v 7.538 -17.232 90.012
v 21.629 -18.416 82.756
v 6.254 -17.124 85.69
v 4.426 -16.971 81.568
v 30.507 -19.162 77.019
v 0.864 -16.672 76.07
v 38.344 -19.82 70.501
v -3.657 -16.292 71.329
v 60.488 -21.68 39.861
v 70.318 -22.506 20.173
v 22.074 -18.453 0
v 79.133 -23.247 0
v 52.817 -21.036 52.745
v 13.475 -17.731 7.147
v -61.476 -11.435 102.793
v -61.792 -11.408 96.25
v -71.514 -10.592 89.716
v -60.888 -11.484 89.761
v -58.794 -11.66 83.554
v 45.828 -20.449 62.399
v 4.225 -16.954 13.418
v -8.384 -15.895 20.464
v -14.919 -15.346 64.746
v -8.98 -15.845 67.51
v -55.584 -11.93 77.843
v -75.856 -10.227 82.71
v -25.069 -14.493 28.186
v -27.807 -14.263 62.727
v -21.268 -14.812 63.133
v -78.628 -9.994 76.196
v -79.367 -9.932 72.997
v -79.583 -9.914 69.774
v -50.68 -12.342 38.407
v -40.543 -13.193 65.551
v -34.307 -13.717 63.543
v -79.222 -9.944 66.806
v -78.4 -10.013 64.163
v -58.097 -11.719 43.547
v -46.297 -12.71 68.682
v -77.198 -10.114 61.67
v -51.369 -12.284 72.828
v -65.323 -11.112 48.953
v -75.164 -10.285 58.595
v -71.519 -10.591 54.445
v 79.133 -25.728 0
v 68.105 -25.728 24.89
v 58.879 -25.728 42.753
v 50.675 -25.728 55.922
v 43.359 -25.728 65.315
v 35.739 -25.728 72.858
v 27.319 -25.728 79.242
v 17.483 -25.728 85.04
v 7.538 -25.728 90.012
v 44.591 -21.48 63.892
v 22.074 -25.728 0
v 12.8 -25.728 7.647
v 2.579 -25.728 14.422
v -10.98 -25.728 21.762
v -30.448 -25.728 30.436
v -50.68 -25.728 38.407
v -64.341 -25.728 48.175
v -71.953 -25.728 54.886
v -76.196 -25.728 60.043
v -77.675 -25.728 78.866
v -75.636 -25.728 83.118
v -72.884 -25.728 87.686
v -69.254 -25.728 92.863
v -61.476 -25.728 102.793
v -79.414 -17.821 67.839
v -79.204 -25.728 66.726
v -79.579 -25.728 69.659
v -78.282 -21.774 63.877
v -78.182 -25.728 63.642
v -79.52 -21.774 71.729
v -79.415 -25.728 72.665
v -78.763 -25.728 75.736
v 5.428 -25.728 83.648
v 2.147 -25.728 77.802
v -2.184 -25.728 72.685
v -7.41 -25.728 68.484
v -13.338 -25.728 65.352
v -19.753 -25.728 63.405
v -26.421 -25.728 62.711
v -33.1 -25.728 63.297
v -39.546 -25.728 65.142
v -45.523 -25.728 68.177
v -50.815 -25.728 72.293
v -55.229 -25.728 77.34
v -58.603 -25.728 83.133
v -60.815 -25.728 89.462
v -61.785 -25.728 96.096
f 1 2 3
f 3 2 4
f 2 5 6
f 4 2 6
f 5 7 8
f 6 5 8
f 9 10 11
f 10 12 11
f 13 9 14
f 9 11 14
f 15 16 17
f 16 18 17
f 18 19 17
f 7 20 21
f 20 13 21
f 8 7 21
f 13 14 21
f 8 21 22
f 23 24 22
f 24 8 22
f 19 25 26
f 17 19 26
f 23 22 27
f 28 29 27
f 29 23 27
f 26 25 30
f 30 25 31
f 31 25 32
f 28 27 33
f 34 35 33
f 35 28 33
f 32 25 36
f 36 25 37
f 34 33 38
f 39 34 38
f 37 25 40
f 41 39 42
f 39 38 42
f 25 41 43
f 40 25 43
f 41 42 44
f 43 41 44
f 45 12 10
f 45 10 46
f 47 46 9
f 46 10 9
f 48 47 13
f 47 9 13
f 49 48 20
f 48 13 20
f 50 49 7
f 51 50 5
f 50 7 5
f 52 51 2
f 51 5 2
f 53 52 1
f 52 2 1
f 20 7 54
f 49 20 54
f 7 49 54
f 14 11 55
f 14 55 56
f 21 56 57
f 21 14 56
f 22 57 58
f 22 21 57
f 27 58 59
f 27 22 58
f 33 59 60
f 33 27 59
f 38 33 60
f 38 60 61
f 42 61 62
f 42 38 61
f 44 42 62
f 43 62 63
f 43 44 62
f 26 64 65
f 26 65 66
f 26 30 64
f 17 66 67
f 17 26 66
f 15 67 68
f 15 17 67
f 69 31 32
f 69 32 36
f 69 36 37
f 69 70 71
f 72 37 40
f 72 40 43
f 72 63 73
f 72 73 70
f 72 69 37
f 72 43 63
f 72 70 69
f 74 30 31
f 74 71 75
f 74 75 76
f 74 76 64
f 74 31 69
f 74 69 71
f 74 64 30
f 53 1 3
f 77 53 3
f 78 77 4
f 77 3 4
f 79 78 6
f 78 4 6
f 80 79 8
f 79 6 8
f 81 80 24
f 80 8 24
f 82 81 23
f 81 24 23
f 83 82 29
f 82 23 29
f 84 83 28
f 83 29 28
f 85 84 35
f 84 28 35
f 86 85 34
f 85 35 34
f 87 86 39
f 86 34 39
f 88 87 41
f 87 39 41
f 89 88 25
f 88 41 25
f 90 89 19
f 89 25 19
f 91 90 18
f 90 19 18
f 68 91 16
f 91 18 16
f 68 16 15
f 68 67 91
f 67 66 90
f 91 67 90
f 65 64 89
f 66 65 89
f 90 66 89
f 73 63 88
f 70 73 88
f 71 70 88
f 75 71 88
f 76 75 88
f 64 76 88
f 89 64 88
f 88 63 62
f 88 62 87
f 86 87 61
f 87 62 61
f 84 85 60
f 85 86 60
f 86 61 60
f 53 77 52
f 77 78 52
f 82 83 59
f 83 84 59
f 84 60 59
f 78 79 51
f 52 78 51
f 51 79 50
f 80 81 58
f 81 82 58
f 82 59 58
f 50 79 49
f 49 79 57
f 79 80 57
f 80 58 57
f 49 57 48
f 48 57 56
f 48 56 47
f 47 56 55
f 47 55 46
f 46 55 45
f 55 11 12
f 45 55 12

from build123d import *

# Parameters (mm, degrees)
F2_DEPTH = 25.7279276848
F3_DEPTH = 102.7941810931


# Not quite as in the source:
# - a feature names something its author has since deleted; it is built from what else it names


with BuildPart() as f2:
    # F0 (on Front) → F2 (new body, through all)
    with BuildSketch(Plane.XZ):
        with BuildLine():
            ThreePointArc((7.538071066, 90.012077608), (-33.0999025849, 63.2971569556), (-61.4758778659, 102.7931809931))
            add(Edge.make_bspline(
                [(-50.6802275777, 38.4073108435), (-64.2301253741, 47.6853026647), (-91.0055411856, 66.0246371681), (-71.2591028819, 90.6346541889), (-61.4758778659, 102.7931809931)],
                knots=[0, 0, 0, 0, 0.5057307672, 1, 1, 1, 1], degree=3))
            add(Edge.make_bspline(
                [(62.097594142, -64.207687974), (51.1832226367, -40.5716055165), (28.887804967, 7.7111846278), (-23.7900094582, 28.033475615), (-50.6802275777, 38.4073108435)],
                knots=[0, 0, 0, 0, 0.4895343419, 1, 1, 1, 1], degree=3))
            Line((62.097594142, -64.207687974), (96.4130014181, -43.6846762896))
            add(Edge.make_bspline(
                [(96.4130014181, -43.6846762896), (79.9973481318, -1.0988161117), (53.4561883249, 67.712624491), (20.2239489646, 83.857797394), (7.538071066, 90.012077608)],
                knots=[0, 0, 0, 0, 0.6187491541, 1, 1, 1, 1], degree=3))
        make_face()
    extrude(amount=F2_DEPTH)


with BuildPart() as f3:
    # F1 (on Top) → F3 (new body, through all)
    with BuildSketch(Plane.XY):
        Polygon((108.6692065001, -25.7279276848), (-108.6692065001, -7.4702873826), (-108.6692065001, -25.7279276848), align=None)
    extrude(amount=F3_DEPTH)

    # F4: intersect F2
    add(f2.part, mode=Mode.INTERSECT)


solid = f3.part
